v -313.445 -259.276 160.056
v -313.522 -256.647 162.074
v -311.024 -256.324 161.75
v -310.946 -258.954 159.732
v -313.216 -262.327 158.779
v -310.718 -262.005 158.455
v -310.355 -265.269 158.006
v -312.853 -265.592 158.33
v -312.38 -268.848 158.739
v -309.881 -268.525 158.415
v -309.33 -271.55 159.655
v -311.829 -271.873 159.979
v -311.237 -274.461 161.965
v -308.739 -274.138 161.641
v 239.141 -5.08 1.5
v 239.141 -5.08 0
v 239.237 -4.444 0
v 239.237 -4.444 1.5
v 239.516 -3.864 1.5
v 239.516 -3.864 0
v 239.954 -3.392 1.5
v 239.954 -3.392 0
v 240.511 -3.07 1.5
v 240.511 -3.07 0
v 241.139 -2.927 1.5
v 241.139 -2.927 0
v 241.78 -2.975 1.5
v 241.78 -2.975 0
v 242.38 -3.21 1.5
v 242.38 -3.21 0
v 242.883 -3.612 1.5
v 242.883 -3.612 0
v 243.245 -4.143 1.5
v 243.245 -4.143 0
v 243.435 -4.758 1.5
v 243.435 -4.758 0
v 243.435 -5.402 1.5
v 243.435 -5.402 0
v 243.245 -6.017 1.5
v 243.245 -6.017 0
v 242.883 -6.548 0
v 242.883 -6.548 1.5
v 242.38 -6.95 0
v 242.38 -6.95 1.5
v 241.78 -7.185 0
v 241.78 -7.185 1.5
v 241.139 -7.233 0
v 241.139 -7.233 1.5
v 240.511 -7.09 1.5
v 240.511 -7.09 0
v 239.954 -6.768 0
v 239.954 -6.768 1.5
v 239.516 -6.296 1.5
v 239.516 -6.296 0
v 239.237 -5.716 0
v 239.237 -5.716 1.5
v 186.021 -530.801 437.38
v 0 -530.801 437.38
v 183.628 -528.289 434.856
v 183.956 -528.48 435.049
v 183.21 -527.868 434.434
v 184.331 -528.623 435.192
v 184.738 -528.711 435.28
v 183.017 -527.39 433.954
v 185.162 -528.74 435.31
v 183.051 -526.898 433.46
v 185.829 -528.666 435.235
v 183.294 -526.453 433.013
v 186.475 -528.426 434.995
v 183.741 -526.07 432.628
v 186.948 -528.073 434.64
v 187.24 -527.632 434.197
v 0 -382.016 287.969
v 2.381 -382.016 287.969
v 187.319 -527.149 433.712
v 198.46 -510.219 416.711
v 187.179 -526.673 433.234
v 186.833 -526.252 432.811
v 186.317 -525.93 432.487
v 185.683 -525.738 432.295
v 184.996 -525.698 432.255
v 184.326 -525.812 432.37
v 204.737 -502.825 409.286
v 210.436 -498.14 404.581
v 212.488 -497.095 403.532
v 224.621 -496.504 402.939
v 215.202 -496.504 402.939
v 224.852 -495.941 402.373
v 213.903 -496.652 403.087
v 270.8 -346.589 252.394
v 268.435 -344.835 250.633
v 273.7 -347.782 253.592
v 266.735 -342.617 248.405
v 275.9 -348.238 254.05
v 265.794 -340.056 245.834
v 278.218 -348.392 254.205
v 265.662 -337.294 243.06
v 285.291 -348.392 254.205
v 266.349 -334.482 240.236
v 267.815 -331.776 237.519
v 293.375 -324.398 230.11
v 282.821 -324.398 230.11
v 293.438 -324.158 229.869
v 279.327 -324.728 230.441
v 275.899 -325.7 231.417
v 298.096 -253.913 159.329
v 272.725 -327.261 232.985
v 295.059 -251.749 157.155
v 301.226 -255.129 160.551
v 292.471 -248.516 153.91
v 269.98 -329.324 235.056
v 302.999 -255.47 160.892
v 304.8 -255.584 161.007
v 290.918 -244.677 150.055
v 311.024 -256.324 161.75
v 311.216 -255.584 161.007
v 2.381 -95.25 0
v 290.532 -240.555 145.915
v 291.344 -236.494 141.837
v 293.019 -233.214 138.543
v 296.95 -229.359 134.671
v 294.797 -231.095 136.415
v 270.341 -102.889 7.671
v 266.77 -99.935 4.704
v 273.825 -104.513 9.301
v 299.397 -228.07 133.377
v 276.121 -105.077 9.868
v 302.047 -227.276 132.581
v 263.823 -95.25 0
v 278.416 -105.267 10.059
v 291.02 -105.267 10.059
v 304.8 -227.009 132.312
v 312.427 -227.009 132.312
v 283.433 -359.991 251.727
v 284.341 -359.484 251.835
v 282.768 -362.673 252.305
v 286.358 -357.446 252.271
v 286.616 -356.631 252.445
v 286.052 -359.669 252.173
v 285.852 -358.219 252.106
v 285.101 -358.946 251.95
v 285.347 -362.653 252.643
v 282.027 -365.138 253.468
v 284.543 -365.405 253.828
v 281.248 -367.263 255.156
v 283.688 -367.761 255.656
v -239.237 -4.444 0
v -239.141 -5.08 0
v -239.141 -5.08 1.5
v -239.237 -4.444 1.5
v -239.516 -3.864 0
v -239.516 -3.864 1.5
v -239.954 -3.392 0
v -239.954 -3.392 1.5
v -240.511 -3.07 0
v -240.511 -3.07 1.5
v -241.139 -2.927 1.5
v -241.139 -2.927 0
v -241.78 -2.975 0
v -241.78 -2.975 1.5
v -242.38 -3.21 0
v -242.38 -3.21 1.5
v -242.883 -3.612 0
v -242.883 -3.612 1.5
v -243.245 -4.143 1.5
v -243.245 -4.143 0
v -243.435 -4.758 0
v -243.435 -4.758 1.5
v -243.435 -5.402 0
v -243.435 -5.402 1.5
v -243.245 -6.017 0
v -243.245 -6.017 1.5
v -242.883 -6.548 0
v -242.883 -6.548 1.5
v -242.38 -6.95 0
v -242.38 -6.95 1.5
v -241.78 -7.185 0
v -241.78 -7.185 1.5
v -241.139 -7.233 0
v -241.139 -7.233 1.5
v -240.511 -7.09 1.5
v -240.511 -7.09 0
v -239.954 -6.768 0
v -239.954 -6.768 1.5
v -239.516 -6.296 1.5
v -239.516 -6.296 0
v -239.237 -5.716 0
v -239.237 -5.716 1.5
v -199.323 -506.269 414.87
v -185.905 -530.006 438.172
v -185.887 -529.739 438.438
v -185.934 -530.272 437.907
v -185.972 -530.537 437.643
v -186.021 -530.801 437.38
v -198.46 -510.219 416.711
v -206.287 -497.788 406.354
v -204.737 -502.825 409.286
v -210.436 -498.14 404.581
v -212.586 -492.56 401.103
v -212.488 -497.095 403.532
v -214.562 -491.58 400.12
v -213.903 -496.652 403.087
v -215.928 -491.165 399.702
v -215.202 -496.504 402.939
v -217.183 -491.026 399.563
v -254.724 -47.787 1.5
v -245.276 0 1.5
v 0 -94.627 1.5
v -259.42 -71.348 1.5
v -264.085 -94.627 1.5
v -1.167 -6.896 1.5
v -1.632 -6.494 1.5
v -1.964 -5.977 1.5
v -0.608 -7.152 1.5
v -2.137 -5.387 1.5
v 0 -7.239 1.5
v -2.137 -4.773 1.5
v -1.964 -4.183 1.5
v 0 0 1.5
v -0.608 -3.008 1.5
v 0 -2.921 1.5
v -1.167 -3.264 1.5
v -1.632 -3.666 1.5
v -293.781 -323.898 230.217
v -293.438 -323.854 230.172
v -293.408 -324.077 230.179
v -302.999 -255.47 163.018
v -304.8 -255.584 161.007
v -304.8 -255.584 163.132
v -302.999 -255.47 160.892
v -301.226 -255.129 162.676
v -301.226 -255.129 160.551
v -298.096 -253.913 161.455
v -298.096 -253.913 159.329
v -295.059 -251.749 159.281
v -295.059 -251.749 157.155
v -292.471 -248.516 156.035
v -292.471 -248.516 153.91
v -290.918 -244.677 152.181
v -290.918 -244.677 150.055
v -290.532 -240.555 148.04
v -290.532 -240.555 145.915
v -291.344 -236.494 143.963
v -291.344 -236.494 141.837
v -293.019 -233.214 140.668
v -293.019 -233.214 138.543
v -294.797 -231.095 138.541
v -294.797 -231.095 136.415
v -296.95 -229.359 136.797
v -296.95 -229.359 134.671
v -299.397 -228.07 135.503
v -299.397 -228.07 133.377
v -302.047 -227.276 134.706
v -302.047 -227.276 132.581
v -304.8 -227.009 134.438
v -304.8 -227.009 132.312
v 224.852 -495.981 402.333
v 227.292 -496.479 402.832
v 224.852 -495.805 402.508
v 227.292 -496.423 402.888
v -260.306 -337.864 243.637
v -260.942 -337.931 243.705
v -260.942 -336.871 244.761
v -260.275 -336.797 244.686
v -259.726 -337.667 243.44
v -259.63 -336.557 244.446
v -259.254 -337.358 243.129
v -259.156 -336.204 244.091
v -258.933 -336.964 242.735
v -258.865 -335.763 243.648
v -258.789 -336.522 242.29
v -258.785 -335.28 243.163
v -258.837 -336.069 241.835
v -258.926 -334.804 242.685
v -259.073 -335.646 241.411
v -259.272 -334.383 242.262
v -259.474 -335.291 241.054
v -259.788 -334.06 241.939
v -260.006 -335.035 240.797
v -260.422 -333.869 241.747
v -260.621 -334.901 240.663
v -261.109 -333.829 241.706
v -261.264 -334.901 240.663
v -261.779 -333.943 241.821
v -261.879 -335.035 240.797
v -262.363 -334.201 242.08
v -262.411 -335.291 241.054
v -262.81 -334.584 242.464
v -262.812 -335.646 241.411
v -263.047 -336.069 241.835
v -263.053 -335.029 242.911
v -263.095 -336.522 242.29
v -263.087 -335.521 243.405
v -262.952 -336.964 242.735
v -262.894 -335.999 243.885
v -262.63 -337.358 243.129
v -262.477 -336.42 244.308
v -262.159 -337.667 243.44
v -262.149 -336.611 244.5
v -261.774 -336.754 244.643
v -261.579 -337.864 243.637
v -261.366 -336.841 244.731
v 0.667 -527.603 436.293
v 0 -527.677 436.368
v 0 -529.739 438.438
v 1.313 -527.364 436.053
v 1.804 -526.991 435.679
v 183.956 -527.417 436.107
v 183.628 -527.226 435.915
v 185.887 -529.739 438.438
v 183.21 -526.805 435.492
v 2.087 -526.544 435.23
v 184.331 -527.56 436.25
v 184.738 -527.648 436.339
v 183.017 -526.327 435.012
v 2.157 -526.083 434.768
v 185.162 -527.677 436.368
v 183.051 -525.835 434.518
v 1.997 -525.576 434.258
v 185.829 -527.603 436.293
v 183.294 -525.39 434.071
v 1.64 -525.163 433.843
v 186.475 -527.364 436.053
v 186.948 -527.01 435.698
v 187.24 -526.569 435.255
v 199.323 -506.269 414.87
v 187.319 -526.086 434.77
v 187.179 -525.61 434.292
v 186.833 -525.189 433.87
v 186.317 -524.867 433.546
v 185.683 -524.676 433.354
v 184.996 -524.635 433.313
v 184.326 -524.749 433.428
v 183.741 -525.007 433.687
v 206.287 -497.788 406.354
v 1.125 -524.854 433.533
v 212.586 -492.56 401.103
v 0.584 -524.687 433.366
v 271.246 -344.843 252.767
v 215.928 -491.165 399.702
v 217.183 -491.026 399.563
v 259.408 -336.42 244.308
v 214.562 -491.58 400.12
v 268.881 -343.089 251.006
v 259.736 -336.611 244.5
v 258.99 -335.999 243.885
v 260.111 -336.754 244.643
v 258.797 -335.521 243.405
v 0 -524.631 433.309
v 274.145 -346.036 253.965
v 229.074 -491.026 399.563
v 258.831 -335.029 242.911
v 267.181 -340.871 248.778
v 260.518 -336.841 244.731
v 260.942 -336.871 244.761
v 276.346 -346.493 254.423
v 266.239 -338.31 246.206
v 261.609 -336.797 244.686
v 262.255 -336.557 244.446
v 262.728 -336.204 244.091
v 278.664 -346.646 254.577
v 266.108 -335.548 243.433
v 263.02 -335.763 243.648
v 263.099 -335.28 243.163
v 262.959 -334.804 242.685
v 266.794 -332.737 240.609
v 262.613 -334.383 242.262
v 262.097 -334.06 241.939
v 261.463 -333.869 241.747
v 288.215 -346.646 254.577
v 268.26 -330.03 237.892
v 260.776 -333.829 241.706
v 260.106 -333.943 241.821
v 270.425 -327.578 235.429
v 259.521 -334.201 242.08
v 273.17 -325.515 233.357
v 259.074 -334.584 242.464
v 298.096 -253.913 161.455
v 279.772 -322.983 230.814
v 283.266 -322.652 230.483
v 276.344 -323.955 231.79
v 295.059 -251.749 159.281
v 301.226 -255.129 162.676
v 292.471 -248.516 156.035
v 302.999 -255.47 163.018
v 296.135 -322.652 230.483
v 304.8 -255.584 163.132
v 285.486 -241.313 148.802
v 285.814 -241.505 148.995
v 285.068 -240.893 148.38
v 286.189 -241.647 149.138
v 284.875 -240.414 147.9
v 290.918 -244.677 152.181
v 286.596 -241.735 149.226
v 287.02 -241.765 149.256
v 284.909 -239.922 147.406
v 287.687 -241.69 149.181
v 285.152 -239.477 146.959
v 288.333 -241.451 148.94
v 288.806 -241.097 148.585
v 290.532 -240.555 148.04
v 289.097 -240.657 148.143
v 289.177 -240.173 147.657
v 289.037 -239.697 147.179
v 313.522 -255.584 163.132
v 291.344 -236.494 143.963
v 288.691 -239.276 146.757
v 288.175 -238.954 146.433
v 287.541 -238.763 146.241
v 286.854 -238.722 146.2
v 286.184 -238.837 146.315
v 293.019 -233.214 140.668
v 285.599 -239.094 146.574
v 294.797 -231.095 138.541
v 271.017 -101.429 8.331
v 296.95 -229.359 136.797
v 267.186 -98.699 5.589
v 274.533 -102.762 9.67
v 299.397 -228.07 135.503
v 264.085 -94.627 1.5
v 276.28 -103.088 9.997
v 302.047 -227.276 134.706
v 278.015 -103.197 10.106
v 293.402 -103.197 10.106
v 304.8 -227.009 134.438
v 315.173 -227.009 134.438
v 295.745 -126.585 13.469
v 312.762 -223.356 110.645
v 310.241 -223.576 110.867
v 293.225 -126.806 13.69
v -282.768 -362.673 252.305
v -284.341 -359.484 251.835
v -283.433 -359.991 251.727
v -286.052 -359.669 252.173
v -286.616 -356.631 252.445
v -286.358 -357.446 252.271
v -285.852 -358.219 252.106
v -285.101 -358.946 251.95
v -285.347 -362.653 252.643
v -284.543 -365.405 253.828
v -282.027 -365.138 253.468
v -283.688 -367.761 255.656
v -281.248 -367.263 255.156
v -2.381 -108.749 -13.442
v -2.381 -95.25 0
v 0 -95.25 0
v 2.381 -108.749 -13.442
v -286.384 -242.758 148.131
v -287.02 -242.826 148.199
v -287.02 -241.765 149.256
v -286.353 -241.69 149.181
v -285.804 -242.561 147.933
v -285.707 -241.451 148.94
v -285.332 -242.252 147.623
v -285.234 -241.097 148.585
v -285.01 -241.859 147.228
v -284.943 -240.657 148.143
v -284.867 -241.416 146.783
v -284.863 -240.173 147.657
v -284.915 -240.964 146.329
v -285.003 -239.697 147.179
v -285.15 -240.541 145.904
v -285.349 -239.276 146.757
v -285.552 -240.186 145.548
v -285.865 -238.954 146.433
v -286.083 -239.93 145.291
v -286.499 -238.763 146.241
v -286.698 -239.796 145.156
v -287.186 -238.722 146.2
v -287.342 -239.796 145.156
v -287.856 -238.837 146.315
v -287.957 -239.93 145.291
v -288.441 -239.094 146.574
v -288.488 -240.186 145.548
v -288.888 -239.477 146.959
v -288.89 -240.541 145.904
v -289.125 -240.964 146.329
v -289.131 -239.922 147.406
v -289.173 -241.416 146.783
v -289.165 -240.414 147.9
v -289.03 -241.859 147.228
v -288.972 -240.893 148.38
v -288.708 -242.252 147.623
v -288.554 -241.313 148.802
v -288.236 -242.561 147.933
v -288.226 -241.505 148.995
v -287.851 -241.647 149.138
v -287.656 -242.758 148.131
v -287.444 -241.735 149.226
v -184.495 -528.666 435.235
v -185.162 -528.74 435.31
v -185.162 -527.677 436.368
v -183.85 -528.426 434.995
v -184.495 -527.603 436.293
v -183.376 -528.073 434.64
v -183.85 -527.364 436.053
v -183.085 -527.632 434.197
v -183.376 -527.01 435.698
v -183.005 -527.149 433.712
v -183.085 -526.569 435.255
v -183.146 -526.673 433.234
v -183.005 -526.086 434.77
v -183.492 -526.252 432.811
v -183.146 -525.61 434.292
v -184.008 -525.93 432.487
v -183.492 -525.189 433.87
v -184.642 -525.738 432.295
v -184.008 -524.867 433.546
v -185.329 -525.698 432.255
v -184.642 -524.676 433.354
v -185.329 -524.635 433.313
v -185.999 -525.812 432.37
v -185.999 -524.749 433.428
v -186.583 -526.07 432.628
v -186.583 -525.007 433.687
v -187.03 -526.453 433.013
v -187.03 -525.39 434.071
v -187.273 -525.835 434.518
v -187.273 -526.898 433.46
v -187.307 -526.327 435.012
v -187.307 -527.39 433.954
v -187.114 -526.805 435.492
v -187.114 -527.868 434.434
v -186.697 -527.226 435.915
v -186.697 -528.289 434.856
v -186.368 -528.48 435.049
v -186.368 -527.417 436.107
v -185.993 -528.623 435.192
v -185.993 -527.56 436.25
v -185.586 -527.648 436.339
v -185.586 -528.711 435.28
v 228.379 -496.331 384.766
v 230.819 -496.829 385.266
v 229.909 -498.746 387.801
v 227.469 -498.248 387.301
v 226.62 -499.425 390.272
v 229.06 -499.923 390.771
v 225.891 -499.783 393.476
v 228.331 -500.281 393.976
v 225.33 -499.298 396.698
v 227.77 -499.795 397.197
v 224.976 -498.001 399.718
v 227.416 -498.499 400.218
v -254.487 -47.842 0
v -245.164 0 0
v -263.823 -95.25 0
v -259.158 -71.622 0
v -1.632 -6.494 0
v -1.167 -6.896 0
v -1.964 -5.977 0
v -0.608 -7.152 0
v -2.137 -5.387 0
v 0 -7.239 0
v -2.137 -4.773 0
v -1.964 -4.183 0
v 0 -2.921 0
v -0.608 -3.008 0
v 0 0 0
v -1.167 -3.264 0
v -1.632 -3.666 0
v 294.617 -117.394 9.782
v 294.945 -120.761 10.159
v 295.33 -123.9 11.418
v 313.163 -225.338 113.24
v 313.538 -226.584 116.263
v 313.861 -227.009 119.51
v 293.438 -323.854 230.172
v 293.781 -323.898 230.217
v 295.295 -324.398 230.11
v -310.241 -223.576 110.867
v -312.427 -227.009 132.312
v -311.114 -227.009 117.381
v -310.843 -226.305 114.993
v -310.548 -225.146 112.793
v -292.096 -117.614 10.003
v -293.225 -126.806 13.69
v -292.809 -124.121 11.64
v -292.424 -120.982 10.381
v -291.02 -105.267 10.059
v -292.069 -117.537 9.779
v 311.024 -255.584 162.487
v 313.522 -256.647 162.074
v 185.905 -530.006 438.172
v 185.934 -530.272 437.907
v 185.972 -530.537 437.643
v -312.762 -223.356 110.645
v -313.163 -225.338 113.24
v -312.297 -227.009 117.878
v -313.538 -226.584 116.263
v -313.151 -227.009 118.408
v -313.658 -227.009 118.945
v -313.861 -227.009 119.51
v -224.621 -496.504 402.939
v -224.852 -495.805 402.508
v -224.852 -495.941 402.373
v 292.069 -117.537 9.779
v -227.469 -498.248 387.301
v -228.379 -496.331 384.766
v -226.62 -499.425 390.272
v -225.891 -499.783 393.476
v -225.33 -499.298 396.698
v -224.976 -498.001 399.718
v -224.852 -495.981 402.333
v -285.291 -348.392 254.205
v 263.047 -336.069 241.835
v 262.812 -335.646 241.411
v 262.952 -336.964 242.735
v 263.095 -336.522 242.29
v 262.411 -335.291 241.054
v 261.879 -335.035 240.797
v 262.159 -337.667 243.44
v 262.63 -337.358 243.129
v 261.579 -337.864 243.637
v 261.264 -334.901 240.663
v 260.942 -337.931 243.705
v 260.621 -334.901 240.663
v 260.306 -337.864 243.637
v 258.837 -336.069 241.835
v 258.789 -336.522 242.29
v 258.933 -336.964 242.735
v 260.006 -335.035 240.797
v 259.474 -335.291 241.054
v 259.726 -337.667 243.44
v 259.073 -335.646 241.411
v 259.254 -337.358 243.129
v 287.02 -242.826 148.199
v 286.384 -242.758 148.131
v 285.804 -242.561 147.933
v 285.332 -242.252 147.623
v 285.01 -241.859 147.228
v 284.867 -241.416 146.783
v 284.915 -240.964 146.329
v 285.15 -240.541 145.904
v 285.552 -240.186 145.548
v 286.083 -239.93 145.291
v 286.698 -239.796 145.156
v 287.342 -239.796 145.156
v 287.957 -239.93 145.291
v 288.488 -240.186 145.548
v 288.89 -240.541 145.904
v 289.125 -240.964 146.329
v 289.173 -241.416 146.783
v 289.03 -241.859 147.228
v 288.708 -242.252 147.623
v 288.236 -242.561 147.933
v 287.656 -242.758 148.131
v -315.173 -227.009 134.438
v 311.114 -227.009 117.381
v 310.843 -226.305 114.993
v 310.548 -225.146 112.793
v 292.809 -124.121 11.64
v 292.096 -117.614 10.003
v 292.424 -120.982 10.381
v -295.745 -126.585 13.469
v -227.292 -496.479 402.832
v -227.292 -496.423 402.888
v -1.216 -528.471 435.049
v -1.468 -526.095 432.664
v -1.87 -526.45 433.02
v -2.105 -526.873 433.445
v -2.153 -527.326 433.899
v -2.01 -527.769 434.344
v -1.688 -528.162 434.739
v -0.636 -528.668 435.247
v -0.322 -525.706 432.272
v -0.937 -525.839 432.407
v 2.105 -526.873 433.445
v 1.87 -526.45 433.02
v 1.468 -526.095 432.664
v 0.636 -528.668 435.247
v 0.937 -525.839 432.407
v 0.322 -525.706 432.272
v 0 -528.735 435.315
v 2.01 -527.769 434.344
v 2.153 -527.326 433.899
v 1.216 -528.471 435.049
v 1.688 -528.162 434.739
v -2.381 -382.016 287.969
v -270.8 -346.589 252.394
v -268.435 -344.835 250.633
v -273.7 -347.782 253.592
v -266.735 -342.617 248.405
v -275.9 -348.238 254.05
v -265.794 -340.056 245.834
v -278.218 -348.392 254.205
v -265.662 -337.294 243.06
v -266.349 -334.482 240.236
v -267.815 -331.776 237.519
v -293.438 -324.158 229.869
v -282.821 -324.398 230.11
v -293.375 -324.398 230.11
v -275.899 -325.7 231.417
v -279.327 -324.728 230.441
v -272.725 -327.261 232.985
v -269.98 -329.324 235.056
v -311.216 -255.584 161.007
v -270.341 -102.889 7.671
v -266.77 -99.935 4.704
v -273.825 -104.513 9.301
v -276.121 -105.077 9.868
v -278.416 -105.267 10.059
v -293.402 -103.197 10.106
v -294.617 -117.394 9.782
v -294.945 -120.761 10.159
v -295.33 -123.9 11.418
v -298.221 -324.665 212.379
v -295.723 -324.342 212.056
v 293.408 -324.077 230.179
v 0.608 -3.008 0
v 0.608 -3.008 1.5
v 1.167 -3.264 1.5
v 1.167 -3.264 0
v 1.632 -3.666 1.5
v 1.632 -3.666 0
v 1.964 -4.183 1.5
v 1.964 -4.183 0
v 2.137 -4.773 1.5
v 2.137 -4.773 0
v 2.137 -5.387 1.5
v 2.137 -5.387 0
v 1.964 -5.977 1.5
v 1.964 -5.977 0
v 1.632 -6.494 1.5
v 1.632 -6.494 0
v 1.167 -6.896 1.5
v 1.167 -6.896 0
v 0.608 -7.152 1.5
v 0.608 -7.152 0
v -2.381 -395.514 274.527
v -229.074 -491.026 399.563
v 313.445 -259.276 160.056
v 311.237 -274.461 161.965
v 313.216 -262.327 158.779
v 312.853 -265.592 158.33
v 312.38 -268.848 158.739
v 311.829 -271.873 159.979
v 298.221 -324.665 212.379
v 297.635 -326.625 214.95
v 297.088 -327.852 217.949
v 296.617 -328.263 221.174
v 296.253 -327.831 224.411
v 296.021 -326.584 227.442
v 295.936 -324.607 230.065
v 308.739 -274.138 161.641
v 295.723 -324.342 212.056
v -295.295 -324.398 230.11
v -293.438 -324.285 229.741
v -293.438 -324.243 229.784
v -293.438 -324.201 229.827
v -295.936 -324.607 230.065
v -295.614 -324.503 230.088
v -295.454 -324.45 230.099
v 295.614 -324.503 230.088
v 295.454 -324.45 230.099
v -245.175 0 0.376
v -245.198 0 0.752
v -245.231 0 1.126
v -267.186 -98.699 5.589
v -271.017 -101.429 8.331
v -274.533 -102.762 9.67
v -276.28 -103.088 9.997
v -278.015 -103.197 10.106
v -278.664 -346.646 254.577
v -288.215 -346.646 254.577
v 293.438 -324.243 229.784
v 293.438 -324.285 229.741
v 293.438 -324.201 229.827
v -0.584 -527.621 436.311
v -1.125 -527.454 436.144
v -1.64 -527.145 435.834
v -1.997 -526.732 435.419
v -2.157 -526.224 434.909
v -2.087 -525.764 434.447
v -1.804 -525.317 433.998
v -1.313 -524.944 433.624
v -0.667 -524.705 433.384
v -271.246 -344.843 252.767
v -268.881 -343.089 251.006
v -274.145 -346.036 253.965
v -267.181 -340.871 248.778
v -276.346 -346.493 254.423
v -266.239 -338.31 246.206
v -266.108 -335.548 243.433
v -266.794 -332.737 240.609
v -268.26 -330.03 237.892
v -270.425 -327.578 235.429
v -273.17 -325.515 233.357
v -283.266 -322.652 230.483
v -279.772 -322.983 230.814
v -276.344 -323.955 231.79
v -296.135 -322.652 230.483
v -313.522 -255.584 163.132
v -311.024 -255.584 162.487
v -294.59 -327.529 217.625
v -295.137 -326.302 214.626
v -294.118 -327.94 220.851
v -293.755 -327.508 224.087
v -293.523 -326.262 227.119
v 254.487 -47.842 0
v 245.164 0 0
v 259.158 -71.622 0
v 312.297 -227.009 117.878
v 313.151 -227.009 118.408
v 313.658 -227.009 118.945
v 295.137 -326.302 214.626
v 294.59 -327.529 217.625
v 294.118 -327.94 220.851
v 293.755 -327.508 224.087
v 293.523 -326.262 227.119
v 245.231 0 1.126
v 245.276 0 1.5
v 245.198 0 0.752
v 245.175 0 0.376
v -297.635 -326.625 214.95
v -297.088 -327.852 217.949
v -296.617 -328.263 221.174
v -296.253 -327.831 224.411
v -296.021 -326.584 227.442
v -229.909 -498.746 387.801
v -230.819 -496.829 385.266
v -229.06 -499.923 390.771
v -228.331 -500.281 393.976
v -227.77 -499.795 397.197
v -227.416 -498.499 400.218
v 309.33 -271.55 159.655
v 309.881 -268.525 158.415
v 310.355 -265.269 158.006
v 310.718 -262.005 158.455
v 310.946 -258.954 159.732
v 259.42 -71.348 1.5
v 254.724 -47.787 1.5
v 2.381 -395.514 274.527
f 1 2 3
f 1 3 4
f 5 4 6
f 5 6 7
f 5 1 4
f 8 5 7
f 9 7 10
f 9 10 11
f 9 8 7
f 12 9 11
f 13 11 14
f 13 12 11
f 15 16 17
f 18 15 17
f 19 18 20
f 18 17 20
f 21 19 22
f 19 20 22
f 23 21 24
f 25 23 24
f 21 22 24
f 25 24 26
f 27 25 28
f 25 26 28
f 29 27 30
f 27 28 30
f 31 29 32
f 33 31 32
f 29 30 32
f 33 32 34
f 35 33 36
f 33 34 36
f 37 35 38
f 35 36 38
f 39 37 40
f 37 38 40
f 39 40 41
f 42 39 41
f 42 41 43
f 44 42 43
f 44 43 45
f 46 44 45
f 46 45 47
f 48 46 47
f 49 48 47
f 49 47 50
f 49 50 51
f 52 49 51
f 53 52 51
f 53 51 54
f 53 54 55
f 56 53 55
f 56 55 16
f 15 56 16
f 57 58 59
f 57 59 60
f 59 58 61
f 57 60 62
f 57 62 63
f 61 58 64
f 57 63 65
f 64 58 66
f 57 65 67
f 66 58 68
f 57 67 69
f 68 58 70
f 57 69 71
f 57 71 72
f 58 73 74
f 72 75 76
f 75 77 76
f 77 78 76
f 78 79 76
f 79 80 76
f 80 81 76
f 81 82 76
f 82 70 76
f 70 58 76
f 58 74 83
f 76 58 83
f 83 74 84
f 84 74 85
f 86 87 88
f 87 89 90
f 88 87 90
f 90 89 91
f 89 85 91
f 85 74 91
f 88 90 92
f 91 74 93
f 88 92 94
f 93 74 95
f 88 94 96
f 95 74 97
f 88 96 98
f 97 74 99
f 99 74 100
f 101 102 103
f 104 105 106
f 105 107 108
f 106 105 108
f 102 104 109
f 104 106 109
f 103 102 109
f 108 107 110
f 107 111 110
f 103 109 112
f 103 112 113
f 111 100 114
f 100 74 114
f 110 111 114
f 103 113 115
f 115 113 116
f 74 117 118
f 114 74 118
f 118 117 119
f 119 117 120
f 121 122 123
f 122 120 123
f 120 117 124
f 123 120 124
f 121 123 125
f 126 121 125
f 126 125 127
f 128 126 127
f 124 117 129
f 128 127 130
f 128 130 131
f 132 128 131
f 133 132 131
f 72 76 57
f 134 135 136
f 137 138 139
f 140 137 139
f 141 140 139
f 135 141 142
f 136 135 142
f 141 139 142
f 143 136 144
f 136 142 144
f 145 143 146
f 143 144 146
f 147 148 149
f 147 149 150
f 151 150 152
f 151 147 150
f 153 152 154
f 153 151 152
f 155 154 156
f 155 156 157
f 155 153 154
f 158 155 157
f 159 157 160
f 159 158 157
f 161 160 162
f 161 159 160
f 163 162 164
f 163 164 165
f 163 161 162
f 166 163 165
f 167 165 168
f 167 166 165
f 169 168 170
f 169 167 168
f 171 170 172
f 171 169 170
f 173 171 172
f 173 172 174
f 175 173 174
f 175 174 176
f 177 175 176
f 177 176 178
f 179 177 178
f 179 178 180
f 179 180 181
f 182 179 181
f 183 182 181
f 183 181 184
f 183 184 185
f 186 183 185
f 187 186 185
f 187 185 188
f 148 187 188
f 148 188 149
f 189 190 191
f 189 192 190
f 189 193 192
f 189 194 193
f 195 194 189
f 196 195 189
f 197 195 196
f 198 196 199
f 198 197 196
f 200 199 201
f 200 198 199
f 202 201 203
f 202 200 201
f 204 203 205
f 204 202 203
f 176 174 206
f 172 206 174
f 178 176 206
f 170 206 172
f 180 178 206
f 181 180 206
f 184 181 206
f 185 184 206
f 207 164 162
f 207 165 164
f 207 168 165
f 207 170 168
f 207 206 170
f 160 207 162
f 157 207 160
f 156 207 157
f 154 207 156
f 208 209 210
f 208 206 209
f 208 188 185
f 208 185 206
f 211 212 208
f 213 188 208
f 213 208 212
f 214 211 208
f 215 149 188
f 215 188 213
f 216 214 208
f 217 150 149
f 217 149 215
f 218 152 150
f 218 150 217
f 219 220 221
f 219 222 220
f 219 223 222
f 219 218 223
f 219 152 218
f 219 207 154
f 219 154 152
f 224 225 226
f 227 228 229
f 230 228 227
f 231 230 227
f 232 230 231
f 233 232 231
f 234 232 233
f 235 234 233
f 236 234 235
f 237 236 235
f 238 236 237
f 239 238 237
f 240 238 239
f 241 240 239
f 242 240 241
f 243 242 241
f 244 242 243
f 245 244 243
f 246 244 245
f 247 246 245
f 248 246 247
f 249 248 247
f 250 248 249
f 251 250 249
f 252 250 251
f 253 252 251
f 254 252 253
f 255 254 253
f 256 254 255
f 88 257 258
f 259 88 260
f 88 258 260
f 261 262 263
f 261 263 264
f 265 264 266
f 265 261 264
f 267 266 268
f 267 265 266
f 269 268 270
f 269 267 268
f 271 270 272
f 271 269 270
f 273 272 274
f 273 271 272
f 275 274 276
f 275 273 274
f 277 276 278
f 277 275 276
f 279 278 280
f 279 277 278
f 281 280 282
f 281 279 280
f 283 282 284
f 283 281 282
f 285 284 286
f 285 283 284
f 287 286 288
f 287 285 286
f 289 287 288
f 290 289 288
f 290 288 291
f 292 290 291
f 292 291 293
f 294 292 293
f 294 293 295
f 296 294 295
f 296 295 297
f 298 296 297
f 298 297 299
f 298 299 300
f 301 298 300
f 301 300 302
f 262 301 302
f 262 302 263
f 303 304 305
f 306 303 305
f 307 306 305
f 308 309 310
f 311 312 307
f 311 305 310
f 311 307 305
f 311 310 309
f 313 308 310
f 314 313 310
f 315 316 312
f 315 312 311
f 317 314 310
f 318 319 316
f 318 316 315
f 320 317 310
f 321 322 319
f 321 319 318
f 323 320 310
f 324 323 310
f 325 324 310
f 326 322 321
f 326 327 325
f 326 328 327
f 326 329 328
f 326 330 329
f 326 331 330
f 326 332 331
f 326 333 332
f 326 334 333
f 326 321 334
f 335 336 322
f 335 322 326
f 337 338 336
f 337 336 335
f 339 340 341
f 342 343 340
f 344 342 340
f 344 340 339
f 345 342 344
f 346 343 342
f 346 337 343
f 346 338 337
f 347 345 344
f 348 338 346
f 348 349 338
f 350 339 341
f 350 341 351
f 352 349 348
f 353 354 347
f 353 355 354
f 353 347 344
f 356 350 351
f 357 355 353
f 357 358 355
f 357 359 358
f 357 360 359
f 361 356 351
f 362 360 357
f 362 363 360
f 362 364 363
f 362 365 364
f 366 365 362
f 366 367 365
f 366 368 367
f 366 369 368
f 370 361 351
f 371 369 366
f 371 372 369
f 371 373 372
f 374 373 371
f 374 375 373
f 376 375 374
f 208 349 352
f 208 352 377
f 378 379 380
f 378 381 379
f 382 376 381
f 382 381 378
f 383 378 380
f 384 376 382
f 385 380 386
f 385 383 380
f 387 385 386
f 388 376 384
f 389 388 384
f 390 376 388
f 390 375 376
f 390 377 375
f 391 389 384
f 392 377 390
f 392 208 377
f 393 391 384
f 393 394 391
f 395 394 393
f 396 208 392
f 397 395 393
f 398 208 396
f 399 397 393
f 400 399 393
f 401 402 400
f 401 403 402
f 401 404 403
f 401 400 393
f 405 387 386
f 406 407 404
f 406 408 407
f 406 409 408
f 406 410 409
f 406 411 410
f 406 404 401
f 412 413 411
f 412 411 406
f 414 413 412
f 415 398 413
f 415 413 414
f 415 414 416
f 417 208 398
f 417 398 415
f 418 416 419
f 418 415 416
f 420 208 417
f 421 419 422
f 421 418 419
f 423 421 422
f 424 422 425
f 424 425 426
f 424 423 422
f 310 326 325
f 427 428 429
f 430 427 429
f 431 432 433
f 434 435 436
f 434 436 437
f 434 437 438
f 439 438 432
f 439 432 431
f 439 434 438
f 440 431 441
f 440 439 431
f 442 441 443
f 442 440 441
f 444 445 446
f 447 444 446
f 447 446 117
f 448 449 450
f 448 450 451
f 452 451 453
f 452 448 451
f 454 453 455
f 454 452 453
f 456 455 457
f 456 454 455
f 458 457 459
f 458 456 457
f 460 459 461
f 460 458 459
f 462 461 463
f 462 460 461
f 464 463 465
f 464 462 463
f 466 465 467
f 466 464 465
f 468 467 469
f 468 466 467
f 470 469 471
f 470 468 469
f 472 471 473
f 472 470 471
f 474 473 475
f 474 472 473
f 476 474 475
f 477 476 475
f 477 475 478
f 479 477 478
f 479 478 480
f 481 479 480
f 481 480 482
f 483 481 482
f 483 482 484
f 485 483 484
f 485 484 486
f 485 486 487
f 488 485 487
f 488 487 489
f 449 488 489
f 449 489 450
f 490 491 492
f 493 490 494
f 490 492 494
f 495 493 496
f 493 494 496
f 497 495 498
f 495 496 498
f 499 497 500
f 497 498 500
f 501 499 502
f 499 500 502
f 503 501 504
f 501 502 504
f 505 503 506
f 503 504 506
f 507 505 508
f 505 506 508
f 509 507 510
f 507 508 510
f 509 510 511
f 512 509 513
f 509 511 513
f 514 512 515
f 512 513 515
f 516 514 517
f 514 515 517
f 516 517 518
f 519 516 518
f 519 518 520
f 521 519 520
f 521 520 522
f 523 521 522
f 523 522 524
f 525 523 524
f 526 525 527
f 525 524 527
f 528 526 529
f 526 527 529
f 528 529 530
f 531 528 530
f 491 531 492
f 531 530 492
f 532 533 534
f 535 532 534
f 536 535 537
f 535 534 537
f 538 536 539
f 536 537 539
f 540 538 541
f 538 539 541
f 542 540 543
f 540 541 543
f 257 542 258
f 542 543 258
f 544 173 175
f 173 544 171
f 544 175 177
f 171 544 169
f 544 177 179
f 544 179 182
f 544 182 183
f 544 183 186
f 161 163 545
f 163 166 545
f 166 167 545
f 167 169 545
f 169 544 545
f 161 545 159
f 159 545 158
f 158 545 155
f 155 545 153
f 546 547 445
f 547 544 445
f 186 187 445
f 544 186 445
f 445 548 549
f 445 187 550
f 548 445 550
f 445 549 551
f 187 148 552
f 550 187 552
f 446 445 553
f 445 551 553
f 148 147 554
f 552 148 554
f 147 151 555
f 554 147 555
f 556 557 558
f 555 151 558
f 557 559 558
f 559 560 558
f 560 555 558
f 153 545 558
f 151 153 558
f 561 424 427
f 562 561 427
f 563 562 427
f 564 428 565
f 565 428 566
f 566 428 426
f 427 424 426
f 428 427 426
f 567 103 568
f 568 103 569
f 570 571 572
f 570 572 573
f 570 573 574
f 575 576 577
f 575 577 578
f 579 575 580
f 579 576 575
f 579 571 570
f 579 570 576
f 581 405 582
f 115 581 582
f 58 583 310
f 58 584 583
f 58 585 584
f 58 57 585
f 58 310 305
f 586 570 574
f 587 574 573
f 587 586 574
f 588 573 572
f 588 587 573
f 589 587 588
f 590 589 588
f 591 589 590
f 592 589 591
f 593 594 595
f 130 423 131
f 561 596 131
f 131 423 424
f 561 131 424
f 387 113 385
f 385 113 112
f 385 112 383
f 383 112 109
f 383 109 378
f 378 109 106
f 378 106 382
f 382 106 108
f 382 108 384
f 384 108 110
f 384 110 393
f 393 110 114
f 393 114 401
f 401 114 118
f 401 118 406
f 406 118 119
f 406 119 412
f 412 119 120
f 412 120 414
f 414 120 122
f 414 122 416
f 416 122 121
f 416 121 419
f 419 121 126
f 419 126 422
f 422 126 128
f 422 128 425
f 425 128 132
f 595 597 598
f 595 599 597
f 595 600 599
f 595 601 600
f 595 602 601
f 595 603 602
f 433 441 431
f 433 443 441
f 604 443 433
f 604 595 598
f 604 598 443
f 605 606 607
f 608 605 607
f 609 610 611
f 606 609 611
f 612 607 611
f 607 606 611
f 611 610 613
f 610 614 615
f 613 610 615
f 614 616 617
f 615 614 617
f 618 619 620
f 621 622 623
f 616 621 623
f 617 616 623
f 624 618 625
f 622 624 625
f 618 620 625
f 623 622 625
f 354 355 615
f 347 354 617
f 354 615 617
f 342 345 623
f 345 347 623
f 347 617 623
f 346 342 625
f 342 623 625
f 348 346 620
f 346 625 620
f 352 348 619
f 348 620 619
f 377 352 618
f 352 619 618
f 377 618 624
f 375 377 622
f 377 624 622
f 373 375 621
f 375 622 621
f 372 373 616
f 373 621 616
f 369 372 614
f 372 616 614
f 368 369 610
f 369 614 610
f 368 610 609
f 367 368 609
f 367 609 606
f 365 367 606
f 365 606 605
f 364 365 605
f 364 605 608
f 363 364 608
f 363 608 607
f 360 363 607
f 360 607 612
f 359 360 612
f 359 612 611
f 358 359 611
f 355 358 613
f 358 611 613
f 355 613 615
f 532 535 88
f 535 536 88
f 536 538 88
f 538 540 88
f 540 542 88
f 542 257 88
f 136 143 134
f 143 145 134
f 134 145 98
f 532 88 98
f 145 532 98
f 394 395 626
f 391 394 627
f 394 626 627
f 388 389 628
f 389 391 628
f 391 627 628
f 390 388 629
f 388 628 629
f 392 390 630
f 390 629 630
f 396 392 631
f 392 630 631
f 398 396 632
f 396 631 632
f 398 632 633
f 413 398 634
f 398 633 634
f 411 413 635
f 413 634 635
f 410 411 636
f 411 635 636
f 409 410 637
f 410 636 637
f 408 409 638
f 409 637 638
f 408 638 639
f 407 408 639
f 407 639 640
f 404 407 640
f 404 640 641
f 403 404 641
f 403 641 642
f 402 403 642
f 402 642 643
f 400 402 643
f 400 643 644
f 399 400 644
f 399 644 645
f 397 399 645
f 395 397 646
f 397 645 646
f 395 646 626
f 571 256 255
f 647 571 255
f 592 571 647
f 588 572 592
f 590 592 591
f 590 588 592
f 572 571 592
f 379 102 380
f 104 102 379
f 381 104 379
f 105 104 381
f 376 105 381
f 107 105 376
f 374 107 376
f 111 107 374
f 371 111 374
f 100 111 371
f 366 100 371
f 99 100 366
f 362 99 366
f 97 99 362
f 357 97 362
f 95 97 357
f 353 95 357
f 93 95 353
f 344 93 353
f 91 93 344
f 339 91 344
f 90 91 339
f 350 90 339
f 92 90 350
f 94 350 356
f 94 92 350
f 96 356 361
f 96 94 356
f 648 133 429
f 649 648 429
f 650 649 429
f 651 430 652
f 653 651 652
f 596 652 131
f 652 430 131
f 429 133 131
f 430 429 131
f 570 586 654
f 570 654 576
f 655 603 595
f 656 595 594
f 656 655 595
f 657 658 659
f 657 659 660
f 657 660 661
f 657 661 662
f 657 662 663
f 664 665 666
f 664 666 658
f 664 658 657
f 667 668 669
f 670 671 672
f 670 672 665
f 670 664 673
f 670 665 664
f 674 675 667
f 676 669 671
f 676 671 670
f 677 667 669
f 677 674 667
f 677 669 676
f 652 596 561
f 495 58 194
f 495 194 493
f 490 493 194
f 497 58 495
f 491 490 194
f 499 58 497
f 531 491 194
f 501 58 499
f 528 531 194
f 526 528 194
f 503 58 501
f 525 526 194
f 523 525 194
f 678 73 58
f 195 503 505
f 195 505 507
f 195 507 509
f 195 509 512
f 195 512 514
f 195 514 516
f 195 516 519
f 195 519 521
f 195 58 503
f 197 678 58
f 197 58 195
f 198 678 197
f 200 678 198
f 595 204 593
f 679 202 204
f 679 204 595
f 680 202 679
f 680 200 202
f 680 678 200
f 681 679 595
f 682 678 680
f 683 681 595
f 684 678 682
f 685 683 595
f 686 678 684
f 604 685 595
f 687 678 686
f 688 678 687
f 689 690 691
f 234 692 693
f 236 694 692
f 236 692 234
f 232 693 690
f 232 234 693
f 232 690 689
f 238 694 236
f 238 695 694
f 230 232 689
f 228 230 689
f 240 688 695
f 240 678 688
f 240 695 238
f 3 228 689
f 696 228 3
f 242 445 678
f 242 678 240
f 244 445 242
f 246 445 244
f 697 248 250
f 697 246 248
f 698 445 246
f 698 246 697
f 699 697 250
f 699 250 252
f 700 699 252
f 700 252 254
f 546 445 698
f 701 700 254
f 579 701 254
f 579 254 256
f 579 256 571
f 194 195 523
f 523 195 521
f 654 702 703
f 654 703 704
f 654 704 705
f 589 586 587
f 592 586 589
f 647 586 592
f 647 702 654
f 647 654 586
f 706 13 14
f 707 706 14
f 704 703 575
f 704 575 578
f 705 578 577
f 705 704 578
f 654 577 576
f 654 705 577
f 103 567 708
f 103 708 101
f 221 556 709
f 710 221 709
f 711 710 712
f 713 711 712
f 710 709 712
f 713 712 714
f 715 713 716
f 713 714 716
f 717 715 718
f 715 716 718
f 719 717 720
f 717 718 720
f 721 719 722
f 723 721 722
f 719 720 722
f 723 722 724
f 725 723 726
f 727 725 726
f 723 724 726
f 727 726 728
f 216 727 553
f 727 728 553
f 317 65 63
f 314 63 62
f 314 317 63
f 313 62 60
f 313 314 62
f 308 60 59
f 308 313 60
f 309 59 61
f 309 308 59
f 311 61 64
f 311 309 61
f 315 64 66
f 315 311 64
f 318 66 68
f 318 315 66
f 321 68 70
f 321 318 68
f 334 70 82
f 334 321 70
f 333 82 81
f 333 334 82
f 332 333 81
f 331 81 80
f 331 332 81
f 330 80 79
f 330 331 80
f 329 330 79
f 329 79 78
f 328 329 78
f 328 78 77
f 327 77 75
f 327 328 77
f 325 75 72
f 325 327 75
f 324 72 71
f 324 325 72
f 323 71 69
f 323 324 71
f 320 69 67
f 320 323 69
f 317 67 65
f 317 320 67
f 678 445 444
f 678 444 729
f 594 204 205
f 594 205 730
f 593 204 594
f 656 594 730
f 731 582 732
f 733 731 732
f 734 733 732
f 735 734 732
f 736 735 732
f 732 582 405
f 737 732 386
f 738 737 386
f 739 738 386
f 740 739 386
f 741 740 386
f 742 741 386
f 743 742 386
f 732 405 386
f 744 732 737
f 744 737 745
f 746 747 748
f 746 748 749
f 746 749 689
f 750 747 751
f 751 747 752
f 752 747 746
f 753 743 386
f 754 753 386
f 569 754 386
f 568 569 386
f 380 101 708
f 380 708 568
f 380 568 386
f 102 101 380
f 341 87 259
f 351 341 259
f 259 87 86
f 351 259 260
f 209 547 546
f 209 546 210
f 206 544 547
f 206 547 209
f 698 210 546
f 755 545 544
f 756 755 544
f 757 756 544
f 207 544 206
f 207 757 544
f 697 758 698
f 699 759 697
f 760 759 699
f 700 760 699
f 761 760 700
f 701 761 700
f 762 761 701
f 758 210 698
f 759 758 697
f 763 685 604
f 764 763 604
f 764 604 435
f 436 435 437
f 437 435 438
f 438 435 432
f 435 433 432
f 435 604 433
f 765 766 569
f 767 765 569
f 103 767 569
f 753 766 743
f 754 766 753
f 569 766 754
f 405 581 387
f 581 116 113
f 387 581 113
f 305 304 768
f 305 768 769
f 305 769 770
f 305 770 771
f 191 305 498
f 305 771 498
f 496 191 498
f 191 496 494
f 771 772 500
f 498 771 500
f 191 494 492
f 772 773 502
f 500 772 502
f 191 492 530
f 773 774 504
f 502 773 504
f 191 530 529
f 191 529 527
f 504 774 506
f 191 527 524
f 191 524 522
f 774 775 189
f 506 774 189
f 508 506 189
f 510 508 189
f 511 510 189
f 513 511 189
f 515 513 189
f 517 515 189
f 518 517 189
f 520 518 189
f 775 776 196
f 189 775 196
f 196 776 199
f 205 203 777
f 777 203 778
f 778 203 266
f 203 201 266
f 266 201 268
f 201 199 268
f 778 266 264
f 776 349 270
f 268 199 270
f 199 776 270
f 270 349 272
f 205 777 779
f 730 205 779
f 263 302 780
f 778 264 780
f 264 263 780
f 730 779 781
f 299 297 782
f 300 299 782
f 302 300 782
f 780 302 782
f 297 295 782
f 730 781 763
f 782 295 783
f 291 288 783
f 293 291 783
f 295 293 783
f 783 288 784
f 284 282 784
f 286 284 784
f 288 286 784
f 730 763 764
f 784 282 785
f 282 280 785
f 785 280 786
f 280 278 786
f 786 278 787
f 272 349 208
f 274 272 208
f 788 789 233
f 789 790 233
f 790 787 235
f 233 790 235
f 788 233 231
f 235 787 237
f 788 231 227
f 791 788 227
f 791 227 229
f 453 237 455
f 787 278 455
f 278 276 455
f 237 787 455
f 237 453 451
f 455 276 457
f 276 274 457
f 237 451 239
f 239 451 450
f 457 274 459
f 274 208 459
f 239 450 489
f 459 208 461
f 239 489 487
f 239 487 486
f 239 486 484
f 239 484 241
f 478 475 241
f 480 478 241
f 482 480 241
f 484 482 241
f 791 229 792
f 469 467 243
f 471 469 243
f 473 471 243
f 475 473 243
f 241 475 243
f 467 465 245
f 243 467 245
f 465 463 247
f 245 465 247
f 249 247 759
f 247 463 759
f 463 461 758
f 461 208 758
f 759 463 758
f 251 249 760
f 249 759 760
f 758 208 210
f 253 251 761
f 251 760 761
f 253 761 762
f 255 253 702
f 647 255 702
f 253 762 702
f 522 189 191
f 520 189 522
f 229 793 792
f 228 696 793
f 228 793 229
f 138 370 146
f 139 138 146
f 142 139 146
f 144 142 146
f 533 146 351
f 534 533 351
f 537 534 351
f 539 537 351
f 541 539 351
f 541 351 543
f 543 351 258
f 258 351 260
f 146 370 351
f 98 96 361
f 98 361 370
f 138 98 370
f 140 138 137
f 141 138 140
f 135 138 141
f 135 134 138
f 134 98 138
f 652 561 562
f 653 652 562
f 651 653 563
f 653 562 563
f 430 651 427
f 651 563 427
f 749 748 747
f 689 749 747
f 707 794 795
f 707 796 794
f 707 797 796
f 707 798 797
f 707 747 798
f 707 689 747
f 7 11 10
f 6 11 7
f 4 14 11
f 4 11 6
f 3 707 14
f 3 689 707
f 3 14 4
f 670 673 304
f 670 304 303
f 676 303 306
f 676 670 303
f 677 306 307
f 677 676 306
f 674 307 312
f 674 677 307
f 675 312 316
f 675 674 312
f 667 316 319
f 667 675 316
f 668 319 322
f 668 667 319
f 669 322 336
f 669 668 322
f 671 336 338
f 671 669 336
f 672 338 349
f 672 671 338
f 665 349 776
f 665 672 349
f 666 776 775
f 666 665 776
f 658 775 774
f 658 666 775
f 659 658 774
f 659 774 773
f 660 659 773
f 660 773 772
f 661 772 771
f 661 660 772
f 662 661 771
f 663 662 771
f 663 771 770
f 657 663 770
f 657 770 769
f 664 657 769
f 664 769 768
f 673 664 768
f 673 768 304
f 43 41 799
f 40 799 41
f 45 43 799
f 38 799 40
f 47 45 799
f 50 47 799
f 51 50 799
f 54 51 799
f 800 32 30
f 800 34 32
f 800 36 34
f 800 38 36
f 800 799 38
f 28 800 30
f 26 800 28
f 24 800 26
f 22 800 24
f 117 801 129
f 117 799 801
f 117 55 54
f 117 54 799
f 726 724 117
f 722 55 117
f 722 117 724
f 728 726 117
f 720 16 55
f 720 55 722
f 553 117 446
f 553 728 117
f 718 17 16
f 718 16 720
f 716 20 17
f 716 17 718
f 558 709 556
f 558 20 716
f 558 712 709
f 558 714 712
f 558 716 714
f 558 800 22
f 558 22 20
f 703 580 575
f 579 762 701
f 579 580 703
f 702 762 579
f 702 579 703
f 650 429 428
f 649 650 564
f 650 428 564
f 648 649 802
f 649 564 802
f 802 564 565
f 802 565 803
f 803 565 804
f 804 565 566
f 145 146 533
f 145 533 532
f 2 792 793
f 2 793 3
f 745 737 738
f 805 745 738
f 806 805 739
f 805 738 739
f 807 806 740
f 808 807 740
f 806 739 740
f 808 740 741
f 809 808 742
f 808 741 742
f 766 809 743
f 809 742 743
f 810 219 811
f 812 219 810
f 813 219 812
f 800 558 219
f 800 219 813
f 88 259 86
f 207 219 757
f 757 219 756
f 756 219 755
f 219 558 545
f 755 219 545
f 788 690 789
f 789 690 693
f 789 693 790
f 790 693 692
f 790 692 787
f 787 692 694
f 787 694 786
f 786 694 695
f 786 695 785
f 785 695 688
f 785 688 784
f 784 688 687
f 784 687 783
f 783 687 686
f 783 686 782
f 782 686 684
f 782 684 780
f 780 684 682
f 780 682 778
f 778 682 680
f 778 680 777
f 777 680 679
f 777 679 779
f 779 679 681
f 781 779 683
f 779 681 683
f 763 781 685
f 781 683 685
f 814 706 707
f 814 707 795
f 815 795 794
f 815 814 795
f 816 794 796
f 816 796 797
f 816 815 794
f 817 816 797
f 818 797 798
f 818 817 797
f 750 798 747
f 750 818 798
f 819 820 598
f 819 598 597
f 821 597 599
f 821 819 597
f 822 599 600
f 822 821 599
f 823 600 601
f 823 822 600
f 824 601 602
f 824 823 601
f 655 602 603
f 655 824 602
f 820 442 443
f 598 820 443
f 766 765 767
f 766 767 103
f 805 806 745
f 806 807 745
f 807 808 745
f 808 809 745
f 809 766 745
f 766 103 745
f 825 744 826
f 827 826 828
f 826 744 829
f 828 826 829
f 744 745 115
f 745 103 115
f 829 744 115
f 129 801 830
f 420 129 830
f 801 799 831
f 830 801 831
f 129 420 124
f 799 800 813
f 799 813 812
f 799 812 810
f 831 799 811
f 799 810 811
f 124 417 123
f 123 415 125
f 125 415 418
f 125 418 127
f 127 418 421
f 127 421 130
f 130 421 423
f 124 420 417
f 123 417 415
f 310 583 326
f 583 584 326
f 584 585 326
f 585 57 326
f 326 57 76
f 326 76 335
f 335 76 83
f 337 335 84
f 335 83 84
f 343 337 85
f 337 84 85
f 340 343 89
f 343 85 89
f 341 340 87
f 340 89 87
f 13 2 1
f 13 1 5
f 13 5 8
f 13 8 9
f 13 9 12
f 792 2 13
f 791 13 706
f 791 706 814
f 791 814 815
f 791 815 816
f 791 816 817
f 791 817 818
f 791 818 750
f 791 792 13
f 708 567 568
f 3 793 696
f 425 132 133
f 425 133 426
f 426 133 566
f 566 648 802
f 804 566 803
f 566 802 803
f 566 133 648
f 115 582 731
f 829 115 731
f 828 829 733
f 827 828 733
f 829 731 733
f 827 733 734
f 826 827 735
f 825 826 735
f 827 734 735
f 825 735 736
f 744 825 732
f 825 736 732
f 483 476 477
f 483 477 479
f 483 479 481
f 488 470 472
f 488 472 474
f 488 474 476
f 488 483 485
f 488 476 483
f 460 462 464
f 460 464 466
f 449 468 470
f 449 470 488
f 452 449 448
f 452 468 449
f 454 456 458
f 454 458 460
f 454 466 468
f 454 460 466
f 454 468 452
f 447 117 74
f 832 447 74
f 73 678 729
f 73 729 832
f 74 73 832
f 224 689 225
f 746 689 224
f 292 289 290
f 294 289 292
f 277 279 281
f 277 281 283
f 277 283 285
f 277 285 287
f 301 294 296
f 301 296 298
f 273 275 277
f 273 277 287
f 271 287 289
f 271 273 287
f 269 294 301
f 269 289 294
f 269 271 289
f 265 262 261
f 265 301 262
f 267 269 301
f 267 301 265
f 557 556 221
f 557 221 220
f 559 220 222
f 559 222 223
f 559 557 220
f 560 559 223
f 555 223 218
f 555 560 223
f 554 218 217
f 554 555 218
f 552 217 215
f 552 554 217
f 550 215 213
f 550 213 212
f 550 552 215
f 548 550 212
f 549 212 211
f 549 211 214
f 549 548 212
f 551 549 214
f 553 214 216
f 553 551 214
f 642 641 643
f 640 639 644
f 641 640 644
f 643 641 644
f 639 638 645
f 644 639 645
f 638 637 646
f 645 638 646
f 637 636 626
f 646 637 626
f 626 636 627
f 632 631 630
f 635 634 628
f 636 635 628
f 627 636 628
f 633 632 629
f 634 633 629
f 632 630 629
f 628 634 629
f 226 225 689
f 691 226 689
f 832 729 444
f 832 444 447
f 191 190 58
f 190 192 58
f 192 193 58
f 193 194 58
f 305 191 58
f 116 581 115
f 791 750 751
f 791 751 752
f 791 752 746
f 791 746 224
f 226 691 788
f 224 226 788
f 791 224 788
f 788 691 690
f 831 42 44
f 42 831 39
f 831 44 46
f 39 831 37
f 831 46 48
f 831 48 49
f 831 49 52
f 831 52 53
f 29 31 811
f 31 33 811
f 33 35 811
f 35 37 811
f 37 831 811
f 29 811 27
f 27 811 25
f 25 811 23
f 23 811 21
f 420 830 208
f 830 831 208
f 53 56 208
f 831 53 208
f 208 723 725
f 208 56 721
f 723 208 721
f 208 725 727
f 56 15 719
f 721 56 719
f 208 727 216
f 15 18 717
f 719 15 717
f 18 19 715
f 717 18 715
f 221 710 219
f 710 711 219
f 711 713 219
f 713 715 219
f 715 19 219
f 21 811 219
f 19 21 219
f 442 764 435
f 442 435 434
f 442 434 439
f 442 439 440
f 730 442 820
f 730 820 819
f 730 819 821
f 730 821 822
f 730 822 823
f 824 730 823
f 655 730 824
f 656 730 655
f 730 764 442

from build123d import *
from build123d.topology import SkipClean

# Parameters (mm, degrees)
UPPER_DEPTH         = 1.5
LOWER_DEPTH         = 1.5
BOSS_EXTRUDE1_DEPTH = 12.7
SKETCH3_R           = 2.159
CUT_EXTRUDE3_DEPTH  = 25.4
SKETCH21_R          = 14.2875
CUT_EXTRUDE28_DEPTH = 874.615346647
SKETCH8_R           = 12.7
CUT_EXTRUDE9_DEPTH  = 909.841508723
SKETCH7_R           = 14.2875
CUT_EXTRUDE10_DEPTH = 768.787550437
SKETCH6_R           = 14.2875
CUT_EXTRUDE11_DEPTH = 805.372191991
CUT_EXTRUDE13_DEPTH = 5.08
CUT_EXTRUDE16_DEPTH = 2.54
CUT_EXTRUDE22_DEPTH = 2.54
SKETCH20_R          = 2.159
CUT_EXTRUDE25_DEPTH = 5.08
SKETCH19_R          = 2.159
CUT_EXTRUDE26_DEPTH = 5.08
SKETCH18_R          = 2.159
CUT_EXTRUDE27_DEPTH = 5.08
SKETCH23_R          = 2.159
CUT_EXTRUDE29_DEPTH = 755.225962057
SKETCH24_W          = 4.7625
SKETCH24_H          = 406.4
BOSS_EXTRUDE2_DEPTH = 19.05


# Read off the part's stored shape, not the designer's step: Mirror1
with BuildPart() as part:
    # Sketch1 → Upper (new body)
    with BuildSketch(Plane.XY):
        Polygon((-268.322950018, 0), (268.322950018, 0), (291.817849942, -95.25), (-291.817849942, -95.25), align=None)
    extrude(amount=UPPER_DEPTH)

    # Sketch2 → Lower (add)
    with BuildSketch(Plane(origin=(0, -47.82449055, -47.624582187), x_dir=(1, 0, 0), z_dir=(0, 0.7085861902250874, 0.7056242704317195))):
        Polygon((-292.843249974, -408.979811759), (-213.216599982, -684.467611759), (-211.306786287, -681.927611759), (-290.367685881, -408.397163128), (-314.93135919, -274.122656346), (-289.573528128, -69.750711759), (-291.817849942, -67.210711759), (-317.5, -274.196511759), align=None)
        Polygon((-213.216599982, -684.467611759), (-211.306786287, -681.927611759), (-290.367685881, -408.397163128), (-314.93135919, -274.122656346), (-289.573528128, -69.750711759), (-291.817849942, -67.210711759), (291.817849942, -67.210711759), (289.573528128, -69.750711759), (314.93135919, -274.122656346), (290.367685881, -408.397163128), (211.306786287, -681.927611759), (213.216599982, -684.467611759), align=None)
        Polygon((213.216599982, -684.467611759), (211.306786287, -681.927611759), (290.367685881, -408.397163128), (314.93135919, -274.122656346), (289.573528128, -69.750711759), (291.817849942, -67.210711759), (317.5, -274.196511759), (292.843249974, -408.979811759), align=None)
    extrude(amount=LOWER_DEPTH)

    # Sketch2<3> → Boss-Extrude1 (add)
    with BuildSketch(Plane(origin=(0, -47.82449055, -47.624582187), x_dir=(1, 0, 0), z_dir=(0, 0.7085861902250874, 0.7056242704317195))):
        Polygon((213.216599982, -684.467611759), (211.306786287, -681.927611759), (290.367685881, -408.397163128), (314.93135919, -274.122656346), (289.573528128, -69.750711759), (291.817849942, -67.210711759), (317.5, -274.196511759), (292.843249974, -408.979811759), align=None)
    extrude(amount=-BOSS_EXTRUDE1_DEPTH)

    # Sketch3 → Cut-Extrude3 (cut)
    with BuildSketch(Plane(origin=(0, 0, 0), x_dir=(-1, 0, 0), z_dir=(0, 0, -1))):
        with Locations((-241.3, -5.08)):
            Circle(SKETCH3_R)
        with Locations((0, -5.08)):
            Circle(SKETCH3_R)
        with Locations((241.3, -5.08)):
            Circle(SKETCH3_R)
    extrude(amount=-CUT_EXTRUDE3_DEPTH, mode=Mode.SUBTRACT)

    # Sketch21 → Cut-Extrude28 (cut, through all)
    with BuildSketch(Plane(origin=(196.85, -539.746170446, 446.36474374), x_dir=(-0.9557127001633002, 0.25055659462572005, -0.15438467422686922), z_dir=(-0.29430126528197925, -0.8136564393089987, 0.5013481465253741))):
        with BuildLine():
            ThreePointArc((0, -14.2875), (-14.2875, 0), (0, 14.2875))
            Line((0, 14.2875), (-38.1, 14.2875))
            Line((-38.1, 14.2875), (-38.1, -14.2875))
            Line((-38.1, -14.2875), (0, -14.2875))
        make_face()
        Circle(SKETCH21_R)
    extrude(amount=-CUT_EXTRUDE28_DEPTH, mode=Mode.SUBTRACT)

    # Sketch8 → Cut-Extrude9 (cut, through all)
    with BuildSketch(Plane(origin=(255.6256, 12.775047317, 0.0545235), x_dir=(0.9817895969366798, 0.189921913110119, 0.004342150101546657), z_dir=(-0.18997154351879111, 0.9815331026321988, 0.022440612520550327))):
        Circle(SKETCH8_R)
        with BuildLine():
            ThreePointArc((12.7, 0), (8.980256121, -8.980256121), (0, -12.7))
            Line((0, -12.7), (50.8, -12.7))
            Line((50.8, -12.7), (50.8, 12.7))
            Line((50.8, 12.7), (0, 12.7))
            ThreePointArc((0, 12.7), (8.980256121, 8.980256121), (12.7, 0))
        make_face()
    extrude(amount=-CUT_EXTRUDE9_DEPTH, mode=Mode.SUBTRACT)

    # Sketch7 → Cut-Extrude10 (cut, symmetric)
    with BuildSketch(Plane(origin=(0, 0, -5.754260468), x_dir=(-1, 0, 0), z_dir=(0, 0, -1))):
        with Locations((-304.8, -241.296170446)):
            Circle(SKETCH7_R)
        with BuildLine():
            Line((-355.6, -255.583670446), (-304.8, -255.583670446))
            ThreePointArc((-304.8, -255.583670446), (-319.0875, -241.296170446), (-304.8, -227.008670446))
            Line((-304.8, -227.008670446), (-355.6, -227.008670446))
            Line((-355.6, -227.008670446), (-355.6, -255.583670446))
        make_face()
    extrude(amount=CUT_EXTRUDE10_DEPTH, both=True, mode=Mode.SUBTRACT)

    # Sketch6 → Cut-Extrude11 (cut, through all)
    with BuildSketch(Plane(origin=(228.6, -539.746170446, 198.722727079), x_dir=(0.9702139044987836, -0.23690600809094062, -0.050601609140820056), z_dir=(0.2422498287248624, 0.948811829172378, 0.202660142369784))):
        Circle(SKETCH6_R)
        with BuildLine():
            ThreePointArc((14.2875, 0), (10.102788136, -10.102788136), (0, -14.2875))
            Line((0, -14.2875), (50.8, -14.2875))
            Line((50.8, -14.2875), (50.8, 14.2875))
            Line((50.8, 14.2875), (0, 14.2875))
            ThreePointArc((0, 14.2875), (10.102788136, 10.102788136), (14.2875, 0))
        make_face()
    extrude(amount=CUT_EXTRUDE11_DEPTH, mode=Mode.SUBTRACT)

    # Sketch12 → Cut-Extrude13 (cut)
    with BuildSketch(Plane(origin=(279.180551252, 24.44271802, -24.545318473), x_dir=(-0.0869176220205297, -0.007609781256081438, -0.9961864374762041), z_dir=(0.9923902182248356, 0.08688540143887281, -0.0872501105355694))):
        with BuildLine():
            ThreePointArc((-34.458545921, -142.642226363), (-35.363095323, -147.648027336), (-38.159492817, -151.897311282))
            Line((-38.159492817, -151.897311282), (-34.334674949, -148.059274691))
            Line((-34.334674949, -148.059274691), (-34.458545921, -142.642226363))
        make_face()
        with BuildLine():
            ThreePointArc((-135.708080175, -249.783030443), (-139.788854201, -252.528666144), (-144.606803116, -253.517908429))
            Line((-144.606803116, -253.517908429), (-139.390384316, -253.478060774))
            Line((-139.390384316, -253.478060774), (-135.708080175, -249.783030443))
        make_face()
        Polygon((-34.458545921, -142.642226363), (-34.334674949, -148.059274691), (-33.456000975, -142.287544019), align=None)
    extrude(amount=-CUT_EXTRUDE13_DEPTH, mode=Mode.SUBTRACT)


with BuildPart() as body_2:
    # of the pieces the cut leaves, the one that is kept (cut_extrude13_keep)
    add(part.part.solids().sort_by_distance((-268.322950018, 0, 0))[0])

    # Sketch9 → Cut-Extrude16 (cut)
    with BuildSketch(Plane(origin=(379.361144518, -77.371751981, 77.696526699), x_dir=(0.19278613597149513, -0.03931926427703094, -0.9804527021911323), z_dir=(0.9606757859804161, -0.19593247679954207, 0.19675492056390054))):
        with BuildLine():
            Line((-176.807332276, -298.778278327), (-178.232267114, -292.159968301))
            ThreePointArc((-178.232267114, -292.159968301), (-178.434275143, -298.314516716), (-181.507674694, -303.650572247))
            Line((-181.507674694, -303.650572247), (-176.807332276, -298.778278327))
        make_face()
        with BuildLine():
            Line((-331.617972049, -441.042646452), (-332.474146327, -440.216866681))
            Line((-332.474146327, -440.216866681), (-322.519098896, -449.820583633))
            Line((-322.519098896, -449.820583633), (-313.701575889, -440.680491291))
            ThreePointArc((-313.701575889, -440.680491291), (-322.58500773, -444.56037453), (-331.617972049, -441.042646452))
        make_face()
        Polygon((-322.519098896, -449.820583633), (-332.474146327, -440.216866681), (-335.674588136, -441.430740469), (-359.267836197, -484.804221539), (-357.714104356, -486.303119554), align=None)
    extrude(amount=-CUT_EXTRUDE16_DEPTH, mode=Mode.SUBTRACT)

    # Sketch10 → Cut-Extrude22 (cut)
    with BuildSketch(Plane(origin=(355.754903335, -45.922355027, 46.115118142), x_dir=(0.12646080723028635, -0.01632409850759065, -0.9918372790143446), z_dir=(0.9836757682395201, -0.12697704918987876, 0.12751004649603565))):
        with BuildLine():
            ThreePointArc((-116.91323791, -214.396901236), (-113.138471271, -223.354168193), (-116.803052388, -232.357075488))
            Line((-116.803052388, -232.357075488), (-97.690742096, -213.008809877))
            Line((-97.690742096, -213.008809877), (-117.980385141, -213.342768044))
            Line((-117.980385141, -213.342768044), (-116.91323791, -214.396901236))
        make_face()
        with BuildLine():
            ThreePointArc((-167.632633505, -283.814184614), (-176.500013499, -287.588081665), (-185.464014694, -284.04980391))
            Line((-185.464014694, -284.04980391), (-182.326299222, -298.68925428))
            Line((-182.326299222, -298.68925428), (-167.632633505, -283.814184614))
        make_face()
        with BuildLine():
            ThreePointArc((-185.464014694, -284.04980391), (-185.528633184, -283.987314925), (-185.592807757, -283.924370136))
            Line((-185.592807757, -283.924370136), (-185.898455633, -283.622449687))
            Line((-185.898455633, -283.622449687), (-186.418418258, -302.057831208))
            Line((-186.418418258, -302.057831208), (-176.55762787, -302.057831208))
            Line((-176.55762787, -302.057831208), (-167.632633505, -283.814184614))
            Line((-167.632633505, -283.814184614), (-182.326299222, -298.68925428))
            Line((-182.326299222, -298.68925428), (-185.464014694, -284.04980391))
        make_face()
    extrude(amount=-CUT_EXTRUDE22_DEPTH, mode=Mode.SUBTRACT)

    # Mirror1
    split(bisect_by=Plane(origin=(0, 0, 0), x_dir=(0, 0, 1), z_dir=(1, 0, 0)), keep=Keep.TOP)

    # Mirror1 2: body 2 across plane


with BuildPart() as body_2_1:
    with SkipClean():  # the faces are left unmerged after this step: merging them gives an invalid solid
        add(body_2.part)
        add(body_2.part.mirror(Plane(origin=(0, 0, 0), x_dir=(0, 0, 1), z_dir=(1, 0, 0))))

    # Sketch20 → Cut-Extrude25 (cut)
    with SkipClean():  # the faces are left unmerged after this step: merging them gives an invalid solid
        with BuildSketch(Plane(origin=(0, -47.82557375, -47.624577646), x_dir=(1, 0, 0), z_dir=(1.6140263867400147e-15, 0.7085942146752751, 0.7056162122065581))):
            with Locations(Location((0, -679.386829065, 0), (0, 0, 269.999999992))):
                Circle(SKETCH20_R)
        cut_extrude25 = extrude(amount=CUT_EXTRUDE25_DEPTH, mode=Mode.SUBTRACT)

    # Sketch19 → Cut-Extrude26 (cut)
    with SkipClean():  # the faces are left unmerged after this step: merging them gives an invalid solid
        with BuildSketch(Plane(origin=(0, -47.82557375, -47.624577646), x_dir=(1, 0, 0), z_dir=(1.6417819623556435e-15, 0.7085942146752751, 0.7056162122065581))):
            with Locations(Location((-260.942318198, -408.979044635, 0), (0, 0, 269.999999991))):
                Circle(SKETCH19_R)
        cut_extrude26 = extrude(amount=CUT_EXTRUDE26_DEPTH, mode=Mode.SUBTRACT)

    # Sketch18 → Cut-Extrude27 (cut)
    with SkipClean():  # the faces are left unmerged after this step: merging them gives an invalid solid
        with BuildSketch(Plane(origin=(0, -47.82557375, -47.624577646), x_dir=(1, 0, 0), z_dir=(1.6972931135869015e-15, 0.7085942146752751, 0.7056162122065581))):
            with Locations(Location((-287.02, -274.195777815, 0), (0, 0, 269.999999991))):
                Circle(SKETCH18_R)
        cut_extrude27 = extrude(amount=CUT_EXTRUDE27_DEPTH, mode=Mode.SUBTRACT)

    # Sketch23 → Cut-Extrude29 (cut, symmetric)
    with SkipClean():  # the faces are left unmerged after this step: merging them gives an invalid solid
        with BuildSketch(Plane(origin=(0, -47.82557375, -47.624577646), x_dir=(1, 0, 0), z_dir=(1.7528042648181593e-15, 0.708594214675275, 0.7056162122065582))):
            with Locations(Location((-185.162281701, -679.386829065, 0), (0, 0, 269.999999991))):
                Circle(SKETCH23_R)
        cut_extrude29 = extrude(amount=CUT_EXTRUDE29_DEPTH, both=True, mode=Mode.SUBTRACT)

    # Mirror2: Cut-Extrude25, Cut-Extrude26, Cut-Extrude27, Cut-Extrude29 across plane
    with SkipClean():  # the faces are left unmerged after this step: merging them gives an invalid solid
        add(cut_extrude25.mirror(Plane(origin=(0, 0, 0), x_dir=(0, 0, 1), z_dir=(1, 0, 0))), mode=Mode.SUBTRACT)
        add(cut_extrude26.mirror(Plane(origin=(0, 0, 0), x_dir=(0, 0, 1), z_dir=(1, 0, 0))), mode=Mode.SUBTRACT)
        add(cut_extrude27.mirror(Plane(origin=(0, 0, 0), x_dir=(0, 0, 1), z_dir=(1, 0, 0))), mode=Mode.SUBTRACT)
        add(cut_extrude29.mirror(Plane(origin=(0, 0, 0), x_dir=(0, 0, 1), z_dir=(1, 0, 0))), mode=Mode.SUBTRACT)

    # Sketch24 → Boss-Extrude2 (add)
    with SkipClean():  # the faces are left unmerged after this step: merging them gives an invalid solid
        with BuildSketch(Plane(origin=(0, -47.82449055, -47.624582187), x_dir=(1, 0, 0), z_dir=(0, -0.7085861902250873, -0.7056242704317196))):
            with Locations((0, 270.410711759)):
                Rectangle(SKETCH24_W, SKETCH24_H)
        extrude(amount=BOSS_EXTRUDE2_DEPTH)


solid = body_2_1.part
